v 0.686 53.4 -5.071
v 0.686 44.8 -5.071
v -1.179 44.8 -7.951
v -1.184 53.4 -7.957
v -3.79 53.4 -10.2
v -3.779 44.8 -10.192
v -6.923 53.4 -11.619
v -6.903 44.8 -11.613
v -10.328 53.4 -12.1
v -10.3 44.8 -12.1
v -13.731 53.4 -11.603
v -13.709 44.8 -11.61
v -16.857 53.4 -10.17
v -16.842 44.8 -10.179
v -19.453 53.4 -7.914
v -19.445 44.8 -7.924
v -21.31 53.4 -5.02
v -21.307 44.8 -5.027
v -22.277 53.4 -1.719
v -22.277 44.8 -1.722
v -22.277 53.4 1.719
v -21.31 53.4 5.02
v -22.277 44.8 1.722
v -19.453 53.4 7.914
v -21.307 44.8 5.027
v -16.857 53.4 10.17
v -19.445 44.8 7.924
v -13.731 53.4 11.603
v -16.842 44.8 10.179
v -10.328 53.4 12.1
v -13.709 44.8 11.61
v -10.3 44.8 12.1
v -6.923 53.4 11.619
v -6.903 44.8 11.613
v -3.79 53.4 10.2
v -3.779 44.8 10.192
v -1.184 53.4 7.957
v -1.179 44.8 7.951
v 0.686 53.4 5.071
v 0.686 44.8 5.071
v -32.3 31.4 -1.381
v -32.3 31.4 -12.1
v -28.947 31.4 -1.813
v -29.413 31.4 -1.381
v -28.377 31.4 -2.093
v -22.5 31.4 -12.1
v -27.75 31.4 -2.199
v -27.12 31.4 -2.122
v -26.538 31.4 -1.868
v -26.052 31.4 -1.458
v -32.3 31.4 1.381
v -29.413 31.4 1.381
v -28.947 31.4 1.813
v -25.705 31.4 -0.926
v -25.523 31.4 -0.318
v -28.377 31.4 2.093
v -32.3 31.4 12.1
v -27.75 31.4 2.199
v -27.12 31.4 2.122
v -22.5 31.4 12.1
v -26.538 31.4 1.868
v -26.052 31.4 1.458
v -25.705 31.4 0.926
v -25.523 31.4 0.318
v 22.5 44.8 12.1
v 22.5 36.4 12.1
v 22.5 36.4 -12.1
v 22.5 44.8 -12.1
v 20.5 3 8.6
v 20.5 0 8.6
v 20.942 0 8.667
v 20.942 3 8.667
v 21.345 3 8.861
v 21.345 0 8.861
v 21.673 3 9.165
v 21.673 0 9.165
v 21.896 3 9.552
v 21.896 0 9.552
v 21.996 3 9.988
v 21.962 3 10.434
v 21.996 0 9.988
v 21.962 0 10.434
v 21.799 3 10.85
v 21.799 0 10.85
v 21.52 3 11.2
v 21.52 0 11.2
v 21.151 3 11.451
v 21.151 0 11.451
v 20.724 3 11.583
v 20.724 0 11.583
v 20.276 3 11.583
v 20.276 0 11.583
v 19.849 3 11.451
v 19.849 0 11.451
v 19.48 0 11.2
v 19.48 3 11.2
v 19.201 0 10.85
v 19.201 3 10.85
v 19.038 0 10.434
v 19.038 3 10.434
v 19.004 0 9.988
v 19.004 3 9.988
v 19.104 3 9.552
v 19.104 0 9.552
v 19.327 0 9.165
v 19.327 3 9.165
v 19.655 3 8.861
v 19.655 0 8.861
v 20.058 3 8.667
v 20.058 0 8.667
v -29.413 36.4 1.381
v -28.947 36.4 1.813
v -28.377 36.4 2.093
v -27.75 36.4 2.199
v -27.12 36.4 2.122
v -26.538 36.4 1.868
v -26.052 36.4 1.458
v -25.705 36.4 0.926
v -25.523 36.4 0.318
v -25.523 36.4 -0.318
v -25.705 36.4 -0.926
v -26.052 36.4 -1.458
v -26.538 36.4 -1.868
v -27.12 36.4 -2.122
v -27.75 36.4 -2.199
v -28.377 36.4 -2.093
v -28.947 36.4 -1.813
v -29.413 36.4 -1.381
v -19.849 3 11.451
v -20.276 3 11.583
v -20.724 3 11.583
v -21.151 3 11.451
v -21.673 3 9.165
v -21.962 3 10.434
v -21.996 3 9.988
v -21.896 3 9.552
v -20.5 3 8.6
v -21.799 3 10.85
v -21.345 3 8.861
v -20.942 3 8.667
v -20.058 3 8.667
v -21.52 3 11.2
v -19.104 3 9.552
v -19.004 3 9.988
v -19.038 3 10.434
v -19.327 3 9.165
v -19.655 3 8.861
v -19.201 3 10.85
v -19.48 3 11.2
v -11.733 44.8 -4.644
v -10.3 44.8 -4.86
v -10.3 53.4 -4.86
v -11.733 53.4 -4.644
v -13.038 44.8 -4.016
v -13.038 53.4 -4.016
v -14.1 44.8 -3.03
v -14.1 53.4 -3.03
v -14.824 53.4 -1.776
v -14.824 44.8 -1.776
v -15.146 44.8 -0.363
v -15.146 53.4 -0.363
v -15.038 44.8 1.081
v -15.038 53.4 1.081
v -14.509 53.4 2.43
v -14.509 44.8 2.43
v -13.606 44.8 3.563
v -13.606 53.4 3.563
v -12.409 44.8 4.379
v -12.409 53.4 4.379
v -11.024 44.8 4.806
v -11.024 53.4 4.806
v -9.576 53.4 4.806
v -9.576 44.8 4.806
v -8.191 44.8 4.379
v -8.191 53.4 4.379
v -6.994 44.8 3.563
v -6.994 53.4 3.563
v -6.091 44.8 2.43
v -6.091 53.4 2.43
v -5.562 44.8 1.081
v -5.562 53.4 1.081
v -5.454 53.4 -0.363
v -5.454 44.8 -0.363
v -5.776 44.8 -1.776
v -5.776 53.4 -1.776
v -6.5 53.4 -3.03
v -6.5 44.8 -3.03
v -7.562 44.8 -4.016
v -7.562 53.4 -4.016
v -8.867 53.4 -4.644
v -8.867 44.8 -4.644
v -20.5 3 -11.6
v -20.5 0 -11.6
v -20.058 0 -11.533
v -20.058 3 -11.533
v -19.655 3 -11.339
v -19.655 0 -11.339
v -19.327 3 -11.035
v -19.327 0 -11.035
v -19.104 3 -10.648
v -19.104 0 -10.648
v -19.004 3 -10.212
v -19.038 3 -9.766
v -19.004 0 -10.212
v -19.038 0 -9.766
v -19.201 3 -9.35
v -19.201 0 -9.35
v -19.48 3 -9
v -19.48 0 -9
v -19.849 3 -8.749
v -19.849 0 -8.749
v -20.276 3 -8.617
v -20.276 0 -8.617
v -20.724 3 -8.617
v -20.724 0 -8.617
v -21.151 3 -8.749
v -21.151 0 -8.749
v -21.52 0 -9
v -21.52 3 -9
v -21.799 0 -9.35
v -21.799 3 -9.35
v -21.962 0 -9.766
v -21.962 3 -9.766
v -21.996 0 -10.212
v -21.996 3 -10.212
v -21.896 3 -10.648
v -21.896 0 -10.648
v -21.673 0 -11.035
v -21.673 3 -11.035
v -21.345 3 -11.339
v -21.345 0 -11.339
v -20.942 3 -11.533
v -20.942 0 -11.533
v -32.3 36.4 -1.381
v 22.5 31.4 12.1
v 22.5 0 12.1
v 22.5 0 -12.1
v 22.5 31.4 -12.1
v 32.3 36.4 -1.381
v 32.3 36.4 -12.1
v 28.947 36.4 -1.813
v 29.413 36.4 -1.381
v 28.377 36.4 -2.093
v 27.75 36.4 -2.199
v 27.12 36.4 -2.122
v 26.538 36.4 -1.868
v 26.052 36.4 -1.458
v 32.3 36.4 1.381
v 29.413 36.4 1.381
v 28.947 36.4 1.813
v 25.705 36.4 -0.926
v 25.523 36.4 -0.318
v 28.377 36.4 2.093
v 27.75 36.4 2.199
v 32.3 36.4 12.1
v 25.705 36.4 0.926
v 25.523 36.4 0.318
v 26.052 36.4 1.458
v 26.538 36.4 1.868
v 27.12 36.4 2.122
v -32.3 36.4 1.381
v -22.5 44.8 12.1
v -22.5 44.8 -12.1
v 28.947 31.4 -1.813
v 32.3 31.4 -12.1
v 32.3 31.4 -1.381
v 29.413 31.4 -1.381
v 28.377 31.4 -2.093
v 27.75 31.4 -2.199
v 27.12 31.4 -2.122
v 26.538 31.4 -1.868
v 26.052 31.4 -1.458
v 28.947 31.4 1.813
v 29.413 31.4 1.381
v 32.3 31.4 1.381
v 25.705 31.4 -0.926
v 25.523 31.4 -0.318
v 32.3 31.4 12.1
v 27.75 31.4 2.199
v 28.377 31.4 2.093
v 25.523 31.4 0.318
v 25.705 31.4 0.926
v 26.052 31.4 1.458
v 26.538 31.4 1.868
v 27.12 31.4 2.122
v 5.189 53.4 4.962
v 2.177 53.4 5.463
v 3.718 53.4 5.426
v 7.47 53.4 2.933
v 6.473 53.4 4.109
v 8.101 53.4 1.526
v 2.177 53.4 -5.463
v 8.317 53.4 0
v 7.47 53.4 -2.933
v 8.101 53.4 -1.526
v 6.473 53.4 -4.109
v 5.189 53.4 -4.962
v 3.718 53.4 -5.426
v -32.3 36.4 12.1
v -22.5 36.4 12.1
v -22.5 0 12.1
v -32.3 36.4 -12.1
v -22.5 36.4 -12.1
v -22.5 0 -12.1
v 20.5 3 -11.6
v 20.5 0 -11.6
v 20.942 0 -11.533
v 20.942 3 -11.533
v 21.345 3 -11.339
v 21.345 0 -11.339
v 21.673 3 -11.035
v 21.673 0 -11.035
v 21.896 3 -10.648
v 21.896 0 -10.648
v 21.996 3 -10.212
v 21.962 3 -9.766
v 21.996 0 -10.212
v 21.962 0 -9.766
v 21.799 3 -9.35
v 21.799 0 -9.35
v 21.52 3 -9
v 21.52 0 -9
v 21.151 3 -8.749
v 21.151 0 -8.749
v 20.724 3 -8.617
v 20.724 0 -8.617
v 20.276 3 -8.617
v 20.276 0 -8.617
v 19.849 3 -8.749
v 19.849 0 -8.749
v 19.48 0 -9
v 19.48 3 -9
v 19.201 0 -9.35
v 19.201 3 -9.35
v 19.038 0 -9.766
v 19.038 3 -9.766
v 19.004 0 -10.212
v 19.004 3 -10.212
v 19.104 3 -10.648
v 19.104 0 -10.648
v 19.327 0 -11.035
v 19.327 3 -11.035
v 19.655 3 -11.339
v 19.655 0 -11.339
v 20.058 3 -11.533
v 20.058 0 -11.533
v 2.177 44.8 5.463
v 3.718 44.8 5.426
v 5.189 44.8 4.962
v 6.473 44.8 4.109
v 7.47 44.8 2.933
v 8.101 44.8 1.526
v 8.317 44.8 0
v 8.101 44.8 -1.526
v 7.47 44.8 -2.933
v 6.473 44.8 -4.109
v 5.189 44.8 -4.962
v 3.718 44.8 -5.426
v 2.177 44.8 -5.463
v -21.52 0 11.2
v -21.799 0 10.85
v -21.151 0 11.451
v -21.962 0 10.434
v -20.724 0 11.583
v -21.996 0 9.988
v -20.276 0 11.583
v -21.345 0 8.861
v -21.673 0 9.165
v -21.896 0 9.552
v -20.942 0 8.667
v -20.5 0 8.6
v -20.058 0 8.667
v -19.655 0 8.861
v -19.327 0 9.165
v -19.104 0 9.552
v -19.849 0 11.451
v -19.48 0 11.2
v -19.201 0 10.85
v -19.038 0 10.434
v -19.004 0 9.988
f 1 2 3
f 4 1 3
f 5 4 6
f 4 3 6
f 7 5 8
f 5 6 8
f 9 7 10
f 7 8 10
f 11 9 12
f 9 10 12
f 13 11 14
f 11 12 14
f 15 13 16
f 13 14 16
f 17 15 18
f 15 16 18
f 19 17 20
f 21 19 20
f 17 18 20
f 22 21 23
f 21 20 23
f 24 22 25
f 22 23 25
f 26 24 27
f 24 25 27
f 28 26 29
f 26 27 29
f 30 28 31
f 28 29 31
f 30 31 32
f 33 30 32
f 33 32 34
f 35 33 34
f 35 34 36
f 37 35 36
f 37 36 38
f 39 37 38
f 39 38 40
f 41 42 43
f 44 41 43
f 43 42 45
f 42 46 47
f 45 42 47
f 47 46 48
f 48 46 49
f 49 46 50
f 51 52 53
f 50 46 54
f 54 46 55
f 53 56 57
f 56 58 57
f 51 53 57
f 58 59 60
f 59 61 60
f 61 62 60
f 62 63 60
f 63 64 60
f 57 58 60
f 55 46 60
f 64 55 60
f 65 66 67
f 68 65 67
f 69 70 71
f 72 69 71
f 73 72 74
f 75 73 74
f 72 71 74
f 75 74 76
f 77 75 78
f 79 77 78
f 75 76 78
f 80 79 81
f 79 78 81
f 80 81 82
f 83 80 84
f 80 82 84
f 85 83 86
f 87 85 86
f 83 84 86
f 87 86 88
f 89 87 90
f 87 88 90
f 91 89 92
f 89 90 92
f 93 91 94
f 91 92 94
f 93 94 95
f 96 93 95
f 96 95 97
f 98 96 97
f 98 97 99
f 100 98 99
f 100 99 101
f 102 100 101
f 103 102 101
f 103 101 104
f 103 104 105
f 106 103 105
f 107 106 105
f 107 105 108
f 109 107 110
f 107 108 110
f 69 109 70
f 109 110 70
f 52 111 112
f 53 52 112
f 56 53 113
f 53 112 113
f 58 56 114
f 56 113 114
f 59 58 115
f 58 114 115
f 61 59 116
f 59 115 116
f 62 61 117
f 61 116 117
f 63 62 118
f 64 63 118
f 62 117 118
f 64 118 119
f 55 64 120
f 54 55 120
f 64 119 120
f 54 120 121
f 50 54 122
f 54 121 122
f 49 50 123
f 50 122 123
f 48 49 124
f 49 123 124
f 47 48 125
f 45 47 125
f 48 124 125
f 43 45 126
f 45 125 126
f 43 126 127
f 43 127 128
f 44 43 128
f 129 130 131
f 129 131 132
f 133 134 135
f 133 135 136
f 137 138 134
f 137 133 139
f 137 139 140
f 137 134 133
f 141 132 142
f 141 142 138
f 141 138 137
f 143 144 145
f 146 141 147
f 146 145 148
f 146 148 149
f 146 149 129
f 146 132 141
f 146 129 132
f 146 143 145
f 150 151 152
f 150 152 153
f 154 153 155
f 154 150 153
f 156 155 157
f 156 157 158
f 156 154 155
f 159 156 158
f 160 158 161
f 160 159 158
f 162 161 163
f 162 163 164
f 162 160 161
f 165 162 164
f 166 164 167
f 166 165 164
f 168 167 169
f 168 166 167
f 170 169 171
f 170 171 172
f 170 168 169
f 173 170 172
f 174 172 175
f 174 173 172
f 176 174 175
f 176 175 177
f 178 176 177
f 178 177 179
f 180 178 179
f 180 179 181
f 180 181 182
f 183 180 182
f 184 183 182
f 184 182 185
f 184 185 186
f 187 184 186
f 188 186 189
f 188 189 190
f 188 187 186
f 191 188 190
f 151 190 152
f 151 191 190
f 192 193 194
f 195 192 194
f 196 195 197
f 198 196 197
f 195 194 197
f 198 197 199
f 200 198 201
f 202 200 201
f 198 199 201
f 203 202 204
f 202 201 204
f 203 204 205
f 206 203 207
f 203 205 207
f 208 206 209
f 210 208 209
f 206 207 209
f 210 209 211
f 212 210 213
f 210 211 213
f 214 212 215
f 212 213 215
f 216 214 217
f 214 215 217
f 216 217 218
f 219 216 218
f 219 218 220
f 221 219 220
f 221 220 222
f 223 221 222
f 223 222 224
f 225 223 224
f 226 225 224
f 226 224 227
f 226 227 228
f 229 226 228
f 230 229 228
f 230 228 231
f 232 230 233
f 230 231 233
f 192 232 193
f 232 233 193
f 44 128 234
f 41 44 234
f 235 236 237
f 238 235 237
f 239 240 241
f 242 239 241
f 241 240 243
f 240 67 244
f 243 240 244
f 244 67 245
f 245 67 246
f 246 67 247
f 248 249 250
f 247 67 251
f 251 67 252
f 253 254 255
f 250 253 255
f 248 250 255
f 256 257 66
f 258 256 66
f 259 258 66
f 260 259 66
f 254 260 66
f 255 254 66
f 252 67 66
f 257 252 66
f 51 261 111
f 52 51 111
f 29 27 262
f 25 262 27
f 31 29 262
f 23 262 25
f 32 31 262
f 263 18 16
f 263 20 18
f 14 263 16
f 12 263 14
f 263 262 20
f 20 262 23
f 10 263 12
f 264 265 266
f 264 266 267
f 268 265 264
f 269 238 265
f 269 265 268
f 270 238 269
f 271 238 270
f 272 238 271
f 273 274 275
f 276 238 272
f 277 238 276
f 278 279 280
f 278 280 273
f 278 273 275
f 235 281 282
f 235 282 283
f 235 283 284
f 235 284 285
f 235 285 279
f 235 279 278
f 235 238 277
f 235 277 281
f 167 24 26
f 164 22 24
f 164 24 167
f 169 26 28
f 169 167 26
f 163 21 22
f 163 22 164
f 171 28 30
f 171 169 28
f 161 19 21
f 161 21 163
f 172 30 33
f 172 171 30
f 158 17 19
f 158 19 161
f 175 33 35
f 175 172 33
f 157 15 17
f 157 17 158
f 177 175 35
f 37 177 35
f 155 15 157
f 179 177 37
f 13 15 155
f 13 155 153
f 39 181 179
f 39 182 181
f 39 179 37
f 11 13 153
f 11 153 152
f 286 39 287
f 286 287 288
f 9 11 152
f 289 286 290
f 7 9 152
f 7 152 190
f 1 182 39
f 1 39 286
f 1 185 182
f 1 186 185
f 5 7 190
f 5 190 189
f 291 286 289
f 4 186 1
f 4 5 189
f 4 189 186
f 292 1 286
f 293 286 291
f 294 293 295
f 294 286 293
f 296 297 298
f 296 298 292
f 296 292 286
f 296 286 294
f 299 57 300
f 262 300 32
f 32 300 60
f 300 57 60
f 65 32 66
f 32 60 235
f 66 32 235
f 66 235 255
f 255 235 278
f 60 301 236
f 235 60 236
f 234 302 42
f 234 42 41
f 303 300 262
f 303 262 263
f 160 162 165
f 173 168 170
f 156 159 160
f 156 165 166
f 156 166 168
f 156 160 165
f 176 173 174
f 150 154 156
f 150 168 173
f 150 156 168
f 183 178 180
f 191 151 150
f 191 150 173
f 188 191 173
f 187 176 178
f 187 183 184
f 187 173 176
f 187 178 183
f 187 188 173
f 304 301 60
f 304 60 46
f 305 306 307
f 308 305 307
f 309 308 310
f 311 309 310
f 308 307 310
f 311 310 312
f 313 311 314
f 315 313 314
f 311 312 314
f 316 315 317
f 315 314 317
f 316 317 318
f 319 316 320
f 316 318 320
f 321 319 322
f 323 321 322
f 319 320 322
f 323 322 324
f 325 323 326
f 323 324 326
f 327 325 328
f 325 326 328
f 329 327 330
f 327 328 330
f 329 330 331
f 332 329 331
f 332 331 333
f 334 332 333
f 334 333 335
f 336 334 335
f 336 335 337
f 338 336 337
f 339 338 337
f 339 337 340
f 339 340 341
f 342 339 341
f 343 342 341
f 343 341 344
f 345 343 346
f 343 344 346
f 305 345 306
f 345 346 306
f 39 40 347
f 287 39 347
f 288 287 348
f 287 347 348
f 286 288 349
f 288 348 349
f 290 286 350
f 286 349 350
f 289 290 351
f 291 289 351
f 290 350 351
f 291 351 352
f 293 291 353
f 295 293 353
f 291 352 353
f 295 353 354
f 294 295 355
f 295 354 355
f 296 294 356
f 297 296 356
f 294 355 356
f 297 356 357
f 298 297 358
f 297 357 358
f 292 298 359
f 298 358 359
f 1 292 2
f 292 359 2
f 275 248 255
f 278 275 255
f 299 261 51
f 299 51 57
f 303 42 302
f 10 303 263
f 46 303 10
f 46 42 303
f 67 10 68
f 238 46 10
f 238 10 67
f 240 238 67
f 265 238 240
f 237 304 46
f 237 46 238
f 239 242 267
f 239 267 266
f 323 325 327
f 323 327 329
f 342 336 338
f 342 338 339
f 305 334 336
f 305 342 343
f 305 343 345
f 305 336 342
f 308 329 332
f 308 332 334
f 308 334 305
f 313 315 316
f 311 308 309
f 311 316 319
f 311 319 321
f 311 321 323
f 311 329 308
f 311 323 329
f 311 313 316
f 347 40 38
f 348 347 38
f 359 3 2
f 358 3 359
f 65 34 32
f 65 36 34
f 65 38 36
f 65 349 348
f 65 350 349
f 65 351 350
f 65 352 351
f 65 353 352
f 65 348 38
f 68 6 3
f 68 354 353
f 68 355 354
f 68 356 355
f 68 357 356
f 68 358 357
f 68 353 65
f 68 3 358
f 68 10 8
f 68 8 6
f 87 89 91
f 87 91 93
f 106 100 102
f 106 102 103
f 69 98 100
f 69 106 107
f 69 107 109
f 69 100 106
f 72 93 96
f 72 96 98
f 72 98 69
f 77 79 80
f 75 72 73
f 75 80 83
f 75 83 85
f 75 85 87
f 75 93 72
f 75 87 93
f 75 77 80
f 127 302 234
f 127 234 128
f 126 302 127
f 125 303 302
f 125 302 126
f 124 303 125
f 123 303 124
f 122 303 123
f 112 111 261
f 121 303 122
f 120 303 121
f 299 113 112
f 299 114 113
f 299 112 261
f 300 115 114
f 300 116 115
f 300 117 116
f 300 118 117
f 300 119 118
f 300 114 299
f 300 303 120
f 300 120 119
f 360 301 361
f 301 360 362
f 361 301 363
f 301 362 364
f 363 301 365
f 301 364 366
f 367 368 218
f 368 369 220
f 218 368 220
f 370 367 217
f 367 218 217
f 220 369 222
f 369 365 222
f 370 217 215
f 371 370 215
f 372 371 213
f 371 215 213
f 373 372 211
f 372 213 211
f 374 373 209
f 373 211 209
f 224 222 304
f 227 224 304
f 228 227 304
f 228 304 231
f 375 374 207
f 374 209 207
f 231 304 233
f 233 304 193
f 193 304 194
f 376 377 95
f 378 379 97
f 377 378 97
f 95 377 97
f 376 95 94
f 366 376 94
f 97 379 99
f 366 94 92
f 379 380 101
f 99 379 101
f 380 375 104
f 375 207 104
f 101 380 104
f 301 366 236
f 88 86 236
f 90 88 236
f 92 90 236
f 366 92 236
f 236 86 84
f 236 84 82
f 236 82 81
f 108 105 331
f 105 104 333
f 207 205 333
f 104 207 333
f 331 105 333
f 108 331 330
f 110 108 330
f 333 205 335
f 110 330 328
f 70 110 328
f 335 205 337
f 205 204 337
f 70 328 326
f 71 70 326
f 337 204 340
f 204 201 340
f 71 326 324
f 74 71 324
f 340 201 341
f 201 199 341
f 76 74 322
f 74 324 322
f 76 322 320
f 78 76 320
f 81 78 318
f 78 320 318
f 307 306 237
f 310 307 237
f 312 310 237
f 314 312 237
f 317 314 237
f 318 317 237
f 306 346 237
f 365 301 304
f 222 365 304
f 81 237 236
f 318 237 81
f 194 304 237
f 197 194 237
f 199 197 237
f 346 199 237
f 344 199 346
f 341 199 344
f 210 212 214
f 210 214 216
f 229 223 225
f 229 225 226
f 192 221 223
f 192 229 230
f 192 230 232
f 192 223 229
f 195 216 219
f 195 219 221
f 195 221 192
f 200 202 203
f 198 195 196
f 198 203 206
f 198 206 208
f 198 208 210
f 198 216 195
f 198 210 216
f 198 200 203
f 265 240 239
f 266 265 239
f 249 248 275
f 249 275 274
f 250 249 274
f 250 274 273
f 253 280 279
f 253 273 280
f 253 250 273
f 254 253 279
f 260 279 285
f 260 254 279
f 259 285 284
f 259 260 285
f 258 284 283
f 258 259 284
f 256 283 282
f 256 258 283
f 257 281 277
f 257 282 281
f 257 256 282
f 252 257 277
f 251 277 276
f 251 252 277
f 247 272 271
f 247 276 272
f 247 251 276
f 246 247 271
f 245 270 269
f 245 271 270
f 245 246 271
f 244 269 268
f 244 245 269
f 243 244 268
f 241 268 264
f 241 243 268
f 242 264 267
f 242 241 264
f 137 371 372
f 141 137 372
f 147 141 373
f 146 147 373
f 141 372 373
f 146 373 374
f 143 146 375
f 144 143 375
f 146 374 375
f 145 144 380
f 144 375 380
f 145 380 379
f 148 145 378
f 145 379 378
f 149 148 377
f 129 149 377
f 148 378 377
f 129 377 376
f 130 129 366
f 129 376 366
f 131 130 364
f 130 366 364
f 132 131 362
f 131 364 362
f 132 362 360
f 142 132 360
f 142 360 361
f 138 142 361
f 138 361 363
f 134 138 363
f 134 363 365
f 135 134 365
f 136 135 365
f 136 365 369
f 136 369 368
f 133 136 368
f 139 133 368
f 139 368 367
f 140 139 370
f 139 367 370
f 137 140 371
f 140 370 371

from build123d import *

# Parameters (mm, degrees)
SKETCH1_W           = 45
SKETCH1_H           = 24.2
BOSS_EXTRUDE1_DEPTH = 44.8
SKETCH2_W           = 24.2
SKETCH2_H           = 5
BOSS_EXTRUDE2_DEPTH = 9.8
CUT_EXTRUDE1_DEPTH  = 51.146385712
SKETCH4_R           = 4.86
BOSS_EXTRUDE3_DEPTH = 8.6
SKETCH5_R           = 1.5
CUT_EXTRUDE2_DEPTH  = 3


with BuildPart() as part:
    # Sketch1 → Boss-Extrude1 (new body)
    with BuildSketch(Plane(origin=(0, 0, 0), x_dir=(1, 0, 0), z_dir=(0, 1, 0))):
        Rectangle(SKETCH1_W, SKETCH1_H)
    extrude(amount=BOSS_EXTRUDE1_DEPTH)

    # Sketch2 → Boss-Extrude2 (add)
    with BuildSketch(Plane.ZY.offset(22.5)):
        with Locations((0, 33.9)):
            Rectangle(SKETCH2_W, SKETCH2_H)
    boss_extrude2 = extrude(amount=BOSS_EXTRUDE2_DEPTH)

    # Sketch3 → Cut-Extrude1 (cut, symmetric)
    with BuildSketch(Plane(origin=(0, 36.4, 0), x_dir=(1, 0, 0), z_dir=(0, 1, 0))):
        with BuildLine():
            Line((-29.412527121, 1.381032534), (-32.3, 1.381032534))
            Line((-32.3, 1.381032534), (-32.3, -1.381032534))
            Line((-32.3, -1.381032534), (-29.412527121, -1.381032534))
            ThreePointArc((-29.412527121, -1.381032534), (-25.5, 0), (-29.412527121, 1.381032534))
        make_face()
    cut_extrude1 = extrude(amount=CUT_EXTRUDE1_DEPTH, both=True, mode=Mode.SUBTRACT)

    # Mirror2: Boss-Extrude2, Cut-Extrude1 across plane
    add(boss_extrude2.mirror(Plane.ZY))
    add(cut_extrude1.mirror(Plane.ZY), mode=Mode.SUBTRACT)

    # Sketch4 → Boss-Extrude3 (add)
    with BuildSketch(Plane(origin=(0, 44.8, 0), x_dir=(1, 0, 0), z_dir=(0, 1, 0))):
        with BuildLine():
            ThreePointArc((0.686331497, 5.070554234), (-22.4, 0), (0.686331497, -5.070554234))
            ThreePointArc((0.686331497, -5.070554234), (8.316936989, 0), (0.686331497, 5.070554234))
        make_face()
        with Locations(Location((-10.3, 0, 0), (0, 0, 90))):
            Circle(SKETCH4_R, mode=Mode.SUBTRACT)
    extrude(amount=BOSS_EXTRUDE3_DEPTH)

    # Sketch5 → Cut-Extrude2 (cut)
    with BuildSketch(Plane.XZ):
        with Locations(Location((-20.5, 10.1, 0), (0, 0, 270))):
            Circle(SKETCH5_R)
        with Locations(Location((20.5, 10.1, 0), (0, 0, 270))):
            Circle(SKETCH5_R)
        with Locations(Location((20.5, -10.1, 0), (0, 0, 270))):
            Circle(SKETCH5_R)
        with Locations(Location((-20.5, -10.1, 0), (0, 0, 270))):
            Circle(SKETCH5_R)
    extrude(amount=-CUT_EXTRUDE2_DEPTH, mode=Mode.SUBTRACT)


solid = part.part
